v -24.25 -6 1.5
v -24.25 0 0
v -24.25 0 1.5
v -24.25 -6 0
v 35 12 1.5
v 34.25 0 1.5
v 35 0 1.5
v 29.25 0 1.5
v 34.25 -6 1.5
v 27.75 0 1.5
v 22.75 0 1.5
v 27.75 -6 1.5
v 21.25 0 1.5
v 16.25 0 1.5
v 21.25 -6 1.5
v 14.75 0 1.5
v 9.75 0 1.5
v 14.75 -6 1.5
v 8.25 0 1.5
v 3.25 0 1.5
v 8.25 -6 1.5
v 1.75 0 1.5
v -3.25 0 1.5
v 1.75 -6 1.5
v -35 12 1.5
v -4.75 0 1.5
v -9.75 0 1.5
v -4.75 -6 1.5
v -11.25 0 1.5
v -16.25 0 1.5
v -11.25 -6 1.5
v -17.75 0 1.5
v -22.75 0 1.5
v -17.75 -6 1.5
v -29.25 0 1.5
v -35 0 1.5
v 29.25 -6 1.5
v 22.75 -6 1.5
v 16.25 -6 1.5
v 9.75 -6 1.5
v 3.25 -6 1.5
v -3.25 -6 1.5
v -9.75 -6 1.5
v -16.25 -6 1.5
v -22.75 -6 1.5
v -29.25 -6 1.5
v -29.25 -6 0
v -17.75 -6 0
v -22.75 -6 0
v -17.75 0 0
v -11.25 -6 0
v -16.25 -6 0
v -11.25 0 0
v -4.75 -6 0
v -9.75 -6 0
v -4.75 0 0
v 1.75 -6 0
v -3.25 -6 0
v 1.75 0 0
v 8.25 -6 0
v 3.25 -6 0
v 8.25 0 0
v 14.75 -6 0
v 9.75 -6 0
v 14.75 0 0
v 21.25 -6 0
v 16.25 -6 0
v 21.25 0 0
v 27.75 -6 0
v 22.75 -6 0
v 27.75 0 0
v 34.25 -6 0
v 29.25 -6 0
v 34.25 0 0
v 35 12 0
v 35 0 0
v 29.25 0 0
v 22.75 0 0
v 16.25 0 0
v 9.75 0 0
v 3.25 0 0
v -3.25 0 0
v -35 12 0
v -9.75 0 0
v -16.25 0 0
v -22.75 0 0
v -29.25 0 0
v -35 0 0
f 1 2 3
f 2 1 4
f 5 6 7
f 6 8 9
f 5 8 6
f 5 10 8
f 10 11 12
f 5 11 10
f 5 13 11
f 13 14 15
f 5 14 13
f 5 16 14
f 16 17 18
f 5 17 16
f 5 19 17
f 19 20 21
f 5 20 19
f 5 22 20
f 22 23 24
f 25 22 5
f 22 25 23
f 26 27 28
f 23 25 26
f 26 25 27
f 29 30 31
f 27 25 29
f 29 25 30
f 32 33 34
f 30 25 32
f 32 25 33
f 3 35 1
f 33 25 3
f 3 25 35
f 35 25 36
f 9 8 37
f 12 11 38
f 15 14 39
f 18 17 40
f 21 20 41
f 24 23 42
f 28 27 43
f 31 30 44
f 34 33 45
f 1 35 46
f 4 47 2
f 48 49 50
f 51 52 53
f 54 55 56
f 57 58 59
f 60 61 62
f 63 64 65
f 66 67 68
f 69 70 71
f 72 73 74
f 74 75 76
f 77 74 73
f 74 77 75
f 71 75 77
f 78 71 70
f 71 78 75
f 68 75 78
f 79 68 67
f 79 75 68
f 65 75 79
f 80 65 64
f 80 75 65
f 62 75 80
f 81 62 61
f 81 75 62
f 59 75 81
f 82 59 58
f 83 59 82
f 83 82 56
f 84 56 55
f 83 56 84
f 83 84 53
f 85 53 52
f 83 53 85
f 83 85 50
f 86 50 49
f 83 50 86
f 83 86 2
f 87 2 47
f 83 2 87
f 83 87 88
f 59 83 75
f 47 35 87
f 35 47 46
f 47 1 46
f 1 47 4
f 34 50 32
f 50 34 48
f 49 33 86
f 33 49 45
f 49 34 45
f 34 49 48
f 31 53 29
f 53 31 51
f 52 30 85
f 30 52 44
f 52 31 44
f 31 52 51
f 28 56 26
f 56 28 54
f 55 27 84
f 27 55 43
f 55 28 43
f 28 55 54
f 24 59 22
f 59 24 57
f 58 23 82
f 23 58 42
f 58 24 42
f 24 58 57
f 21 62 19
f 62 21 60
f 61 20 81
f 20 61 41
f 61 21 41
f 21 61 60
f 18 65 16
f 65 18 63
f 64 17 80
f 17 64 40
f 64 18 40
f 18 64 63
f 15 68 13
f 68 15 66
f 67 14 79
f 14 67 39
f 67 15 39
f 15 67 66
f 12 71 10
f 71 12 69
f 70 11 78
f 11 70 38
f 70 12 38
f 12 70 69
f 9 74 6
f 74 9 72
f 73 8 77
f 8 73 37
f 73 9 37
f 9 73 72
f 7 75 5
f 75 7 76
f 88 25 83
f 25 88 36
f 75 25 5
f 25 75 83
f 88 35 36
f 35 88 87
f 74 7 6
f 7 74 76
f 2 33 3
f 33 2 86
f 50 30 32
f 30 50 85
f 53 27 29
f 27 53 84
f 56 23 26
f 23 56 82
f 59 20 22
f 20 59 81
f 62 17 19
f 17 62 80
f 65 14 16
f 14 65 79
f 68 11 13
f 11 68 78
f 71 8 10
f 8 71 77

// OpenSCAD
// --- Dimensions ---
plate_thickness = 1.5;    // Z height of the plate
spine_length = 70;        // X length of the spine
spine_width = 12;         // Y width of the spine
num_teeth = 10;           // Number of teeth
tooth_width = 5.0;        // X width of each tooth
tooth_length = 12;        // Y length of each tooth (hanging in -Y)
gap_width = 1.5;          // Y gap between teeth

// --- Calculated Values ---
// Total width of one tooth + one gap
feature_pitch = tooth_width + gap_width;
// Total width of the tooth row (10 teeth, 9 gaps)
total_tooth_row_width = (num_teeth * tooth_width) + ((num_teeth - 1) * gap_width);

// --- Module Definitions ---

module spine() {
    // Spine is centered on X, starts at Y=0, goes to Y=spine_width
    // To center on X: X goes from -spine_length/2 to +spine_length/2
    // Z is from 0 to plate_thickness
    translate([-spine_length/2, 0, 0]) {
        cube([spine_length, spine_width, plate_thickness], center=false);
    }
}

module tooth(i) {
    // Each tooth is i-th tooth (0 to 9)
    // Center X of the i-th tooth:
    // The first tooth (i=0) is at the left.
    // The center of the entire row is X=0.
    // The left edge of the first tooth is at -total_tooth_row_width/2.
    // The center of the first tooth is at -total_tooth_row_width/2 + tooth_width/2.
    // Let's calculate the center X for tooth i.
    // Center X_i = -total_tooth_row_width/2 + tooth_width/2 + i * feature_pitch
    
    tooth_center_x = -total_tooth_row_width/2 + tooth_width/2 + i * feature_pitch;
    tooth_center_y = -tooth_length/2; // Hanging in -Y, so center is at -tooth_length/2
    
    // Z is from 0 to plate_thickness
    translate([tooth_center_x, tooth_center_y, 0]) {
        cube([tooth_width, tooth_length, plate_thickness], center=false);
    }
}

// --- Main Assembly ---
union() {
    spine();
    
    for (i = [0 : num_teeth - 1]) {
        tooth(i);
    }
}
